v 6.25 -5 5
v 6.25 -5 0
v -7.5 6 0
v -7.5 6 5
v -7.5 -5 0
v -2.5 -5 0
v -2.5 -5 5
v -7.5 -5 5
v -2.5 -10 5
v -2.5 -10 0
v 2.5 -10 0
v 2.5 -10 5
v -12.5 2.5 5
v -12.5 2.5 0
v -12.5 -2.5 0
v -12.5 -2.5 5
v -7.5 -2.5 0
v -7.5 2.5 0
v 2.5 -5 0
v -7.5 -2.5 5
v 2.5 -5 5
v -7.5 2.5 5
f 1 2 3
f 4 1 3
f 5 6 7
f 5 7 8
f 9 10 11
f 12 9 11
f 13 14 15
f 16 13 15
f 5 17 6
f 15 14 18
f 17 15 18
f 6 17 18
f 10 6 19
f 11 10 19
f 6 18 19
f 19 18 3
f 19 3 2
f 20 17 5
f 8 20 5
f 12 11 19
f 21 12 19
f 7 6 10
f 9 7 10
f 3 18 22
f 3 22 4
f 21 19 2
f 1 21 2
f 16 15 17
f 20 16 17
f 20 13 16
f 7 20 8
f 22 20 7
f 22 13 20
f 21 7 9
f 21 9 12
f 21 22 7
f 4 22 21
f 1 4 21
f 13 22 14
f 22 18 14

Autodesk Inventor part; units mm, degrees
ref_plane "YZ Plane" through (0, 0, 0) normal (1, 0, 0) x (0, 1, 0)
ref_plane "XZ Plane" through (0, 0, 0) normal (0, 1, 0) x (-1, 0, 0)
ref_plane "XY Plane" through (0, 0, 0) normal (0, 0, 1) x (1, 0, 0)
sketch "Sketch1" plane through (0, 0, 0) normal (0, 0, 1) x (1, 0, 0)
  line L0 (-12.5, -10) -> (12.5, -10)
  line L1 (12.5, -10) -> (12.5, 10) construction
  line L2 (12.5, 10) -> (-12.5, 10) construction
  line L3 (-12.5, 10) -> (-12.5, -10)
  line L4 (-12.5, -10) -> (12.5, 10) construction
  line L5 (12.5, -10) -> (-12.5, 10)
  line L6 (-12.5, -2.5) -> (-7.5, -2.5)
  line L7 (-7.5, -2.5) -> (-7.5, 2.5) construction
  line L8 (-7.5, 2.5) -> (-12.5, 2.5)
  line L9 (-12.5, 2.5) -> (-12.5, -2.5)
  line L10 (-12.5, -2.5) -> (-7.5, 2.5) construction
  line L11 (-7.5, -2.5) -> (-12.5, 2.5) construction
  line L12 (-7.5, -2.5) -> (-7.5, -10)
  line L13 (-7.5, 2.5) -> (-7.5, 6)
  line L14 (-2.5, -10) -> (2.5, -10)
  line L15 (2.5, -10) -> (2.5, -5)
  line L16 (2.5, -5) -> (-2.5, -5) construction
  line L17 (-2.5, -5) -> (-2.5, -10)
  line L18 (-2.5, -10) -> (2.5, -5) construction
  line L19 (2.5, -10) -> (-2.5, -5) construction
  line L20 (-2.5, -5) -> (-7.5, -5)
  line L21 (2.5, -5) -> (6.25, -5)
  point P0 (0, 0)
  point P1 (-10, 0)
  point P2 (0, 0)
  point P3 (0, -7.5)
  point P4 (2.5, -10)
  dimension "d0" = 20
  dimension "d1" = 25
  dimension "d2" = 5
  dimension "d3" = 5
  dimension "d4" = 10
  dimension "d5" = 5
  dimension "d6" = 5
  dimension "d7" = 12.5
extrude "Extrusion1" add sketch "Sketch1" along normal blind 5 contours L3 L8 L13 L5 L21 L15 L0 L17 L20 L12 L6
equation "\"d5\" = d3"
equation "\"d6\" = d2"
properties part number "camera-bracket-rib"
